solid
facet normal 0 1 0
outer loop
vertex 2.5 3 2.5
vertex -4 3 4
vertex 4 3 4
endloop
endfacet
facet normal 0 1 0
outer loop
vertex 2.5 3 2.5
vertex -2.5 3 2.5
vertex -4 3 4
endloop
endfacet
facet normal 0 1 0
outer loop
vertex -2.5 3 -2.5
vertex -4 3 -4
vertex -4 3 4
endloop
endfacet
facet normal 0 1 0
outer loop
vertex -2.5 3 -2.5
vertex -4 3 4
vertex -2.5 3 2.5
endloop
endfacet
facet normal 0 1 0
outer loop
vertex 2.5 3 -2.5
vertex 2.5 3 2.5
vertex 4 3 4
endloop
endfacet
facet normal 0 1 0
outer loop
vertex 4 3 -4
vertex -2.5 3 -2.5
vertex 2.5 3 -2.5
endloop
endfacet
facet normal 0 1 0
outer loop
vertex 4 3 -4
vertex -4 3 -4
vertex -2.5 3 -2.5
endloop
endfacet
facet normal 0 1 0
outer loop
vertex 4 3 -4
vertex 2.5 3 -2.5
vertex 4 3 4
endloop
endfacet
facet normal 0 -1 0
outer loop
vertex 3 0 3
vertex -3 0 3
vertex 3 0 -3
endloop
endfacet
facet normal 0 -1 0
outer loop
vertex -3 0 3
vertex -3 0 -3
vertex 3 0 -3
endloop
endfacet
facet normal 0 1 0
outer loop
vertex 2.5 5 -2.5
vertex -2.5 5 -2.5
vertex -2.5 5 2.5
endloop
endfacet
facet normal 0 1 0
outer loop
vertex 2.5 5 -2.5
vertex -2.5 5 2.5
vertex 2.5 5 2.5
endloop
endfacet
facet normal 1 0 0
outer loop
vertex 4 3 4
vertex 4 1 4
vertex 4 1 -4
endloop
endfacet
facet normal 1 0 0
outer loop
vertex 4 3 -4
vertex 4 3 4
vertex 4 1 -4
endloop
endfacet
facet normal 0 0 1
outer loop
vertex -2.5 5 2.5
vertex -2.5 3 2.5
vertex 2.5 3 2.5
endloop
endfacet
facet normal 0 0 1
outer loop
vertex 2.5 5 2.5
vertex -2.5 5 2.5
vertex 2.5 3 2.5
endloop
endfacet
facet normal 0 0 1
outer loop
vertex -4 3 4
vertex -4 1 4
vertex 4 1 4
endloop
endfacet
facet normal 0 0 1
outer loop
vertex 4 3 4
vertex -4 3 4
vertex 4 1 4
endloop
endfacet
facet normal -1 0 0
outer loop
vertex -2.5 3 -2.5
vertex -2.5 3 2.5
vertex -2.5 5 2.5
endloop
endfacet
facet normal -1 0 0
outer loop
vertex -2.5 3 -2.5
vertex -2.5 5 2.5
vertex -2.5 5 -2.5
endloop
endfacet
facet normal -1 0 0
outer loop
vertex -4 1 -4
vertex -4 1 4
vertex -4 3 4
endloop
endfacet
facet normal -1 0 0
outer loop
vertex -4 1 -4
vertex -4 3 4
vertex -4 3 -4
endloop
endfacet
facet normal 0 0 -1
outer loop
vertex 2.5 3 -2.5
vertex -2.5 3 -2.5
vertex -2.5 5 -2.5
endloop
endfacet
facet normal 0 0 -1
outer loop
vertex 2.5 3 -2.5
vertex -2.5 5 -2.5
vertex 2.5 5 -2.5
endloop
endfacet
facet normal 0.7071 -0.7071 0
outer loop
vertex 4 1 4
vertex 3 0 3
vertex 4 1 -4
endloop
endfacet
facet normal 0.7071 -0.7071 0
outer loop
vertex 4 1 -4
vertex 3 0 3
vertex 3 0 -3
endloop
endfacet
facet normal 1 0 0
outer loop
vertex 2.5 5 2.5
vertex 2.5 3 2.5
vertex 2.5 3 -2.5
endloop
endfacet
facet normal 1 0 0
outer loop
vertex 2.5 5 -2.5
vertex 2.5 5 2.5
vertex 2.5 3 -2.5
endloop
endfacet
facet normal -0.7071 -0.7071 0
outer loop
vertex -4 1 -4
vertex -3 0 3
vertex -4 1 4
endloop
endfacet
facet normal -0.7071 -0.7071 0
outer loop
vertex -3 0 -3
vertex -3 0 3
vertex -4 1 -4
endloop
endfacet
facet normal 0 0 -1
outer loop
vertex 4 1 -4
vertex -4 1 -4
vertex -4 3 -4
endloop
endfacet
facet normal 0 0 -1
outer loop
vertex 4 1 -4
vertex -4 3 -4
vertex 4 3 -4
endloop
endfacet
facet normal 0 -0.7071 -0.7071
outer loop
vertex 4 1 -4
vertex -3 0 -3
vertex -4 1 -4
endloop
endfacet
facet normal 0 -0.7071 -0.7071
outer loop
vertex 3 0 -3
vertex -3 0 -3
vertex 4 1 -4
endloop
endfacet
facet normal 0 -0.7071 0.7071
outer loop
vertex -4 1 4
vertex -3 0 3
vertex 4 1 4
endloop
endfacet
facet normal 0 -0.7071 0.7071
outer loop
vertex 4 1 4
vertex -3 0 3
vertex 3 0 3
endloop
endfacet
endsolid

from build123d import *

# Parameters (mm, degrees)
ESQUISSE1_W        = 8
ESQUISSE1_H        = 8
BOSS_EXTRU_1_DEPTH = 3
CHANFREIN1_SIZE    = 1
ESQUISSE2_W        = 5
ESQUISSE2_H        = 5
BOSS_EXTRU_2_DEPTH = 2


with BuildPart() as part:
    # Esquisse1 → Boss.-Extru.1 (new body)
    with BuildSketch(Plane(origin=(0, 0, 0), x_dir=(1, 0, 0), z_dir=(0, 1, 0))):
        Rectangle(ESQUISSE1_W, ESQUISSE1_H)
    extrude(amount=BOSS_EXTRU_1_DEPTH)

    # Chanfrein1
    chanfrein1_edges = [part.edges().sort_by_distance(p)[0] for p in [
        (0, 0, 4),
        (-4, 0, 0),
        (0, 0, -4),
        (4, 0, 0),
    ]]
    chamfer(chanfrein1_edges, length=CHANFREIN1_SIZE)

    # Esquisse2 → Boss.-Extru.2 (add)
    with BuildSketch(Plane(origin=(0, 3, 0), x_dir=(1, 0, 0), z_dir=(0, 1, 0))):
        Rectangle(ESQUISSE2_W, ESQUISSE2_H)
    extrude(amount=BOSS_EXTRU_2_DEPTH)


solid = part.part
